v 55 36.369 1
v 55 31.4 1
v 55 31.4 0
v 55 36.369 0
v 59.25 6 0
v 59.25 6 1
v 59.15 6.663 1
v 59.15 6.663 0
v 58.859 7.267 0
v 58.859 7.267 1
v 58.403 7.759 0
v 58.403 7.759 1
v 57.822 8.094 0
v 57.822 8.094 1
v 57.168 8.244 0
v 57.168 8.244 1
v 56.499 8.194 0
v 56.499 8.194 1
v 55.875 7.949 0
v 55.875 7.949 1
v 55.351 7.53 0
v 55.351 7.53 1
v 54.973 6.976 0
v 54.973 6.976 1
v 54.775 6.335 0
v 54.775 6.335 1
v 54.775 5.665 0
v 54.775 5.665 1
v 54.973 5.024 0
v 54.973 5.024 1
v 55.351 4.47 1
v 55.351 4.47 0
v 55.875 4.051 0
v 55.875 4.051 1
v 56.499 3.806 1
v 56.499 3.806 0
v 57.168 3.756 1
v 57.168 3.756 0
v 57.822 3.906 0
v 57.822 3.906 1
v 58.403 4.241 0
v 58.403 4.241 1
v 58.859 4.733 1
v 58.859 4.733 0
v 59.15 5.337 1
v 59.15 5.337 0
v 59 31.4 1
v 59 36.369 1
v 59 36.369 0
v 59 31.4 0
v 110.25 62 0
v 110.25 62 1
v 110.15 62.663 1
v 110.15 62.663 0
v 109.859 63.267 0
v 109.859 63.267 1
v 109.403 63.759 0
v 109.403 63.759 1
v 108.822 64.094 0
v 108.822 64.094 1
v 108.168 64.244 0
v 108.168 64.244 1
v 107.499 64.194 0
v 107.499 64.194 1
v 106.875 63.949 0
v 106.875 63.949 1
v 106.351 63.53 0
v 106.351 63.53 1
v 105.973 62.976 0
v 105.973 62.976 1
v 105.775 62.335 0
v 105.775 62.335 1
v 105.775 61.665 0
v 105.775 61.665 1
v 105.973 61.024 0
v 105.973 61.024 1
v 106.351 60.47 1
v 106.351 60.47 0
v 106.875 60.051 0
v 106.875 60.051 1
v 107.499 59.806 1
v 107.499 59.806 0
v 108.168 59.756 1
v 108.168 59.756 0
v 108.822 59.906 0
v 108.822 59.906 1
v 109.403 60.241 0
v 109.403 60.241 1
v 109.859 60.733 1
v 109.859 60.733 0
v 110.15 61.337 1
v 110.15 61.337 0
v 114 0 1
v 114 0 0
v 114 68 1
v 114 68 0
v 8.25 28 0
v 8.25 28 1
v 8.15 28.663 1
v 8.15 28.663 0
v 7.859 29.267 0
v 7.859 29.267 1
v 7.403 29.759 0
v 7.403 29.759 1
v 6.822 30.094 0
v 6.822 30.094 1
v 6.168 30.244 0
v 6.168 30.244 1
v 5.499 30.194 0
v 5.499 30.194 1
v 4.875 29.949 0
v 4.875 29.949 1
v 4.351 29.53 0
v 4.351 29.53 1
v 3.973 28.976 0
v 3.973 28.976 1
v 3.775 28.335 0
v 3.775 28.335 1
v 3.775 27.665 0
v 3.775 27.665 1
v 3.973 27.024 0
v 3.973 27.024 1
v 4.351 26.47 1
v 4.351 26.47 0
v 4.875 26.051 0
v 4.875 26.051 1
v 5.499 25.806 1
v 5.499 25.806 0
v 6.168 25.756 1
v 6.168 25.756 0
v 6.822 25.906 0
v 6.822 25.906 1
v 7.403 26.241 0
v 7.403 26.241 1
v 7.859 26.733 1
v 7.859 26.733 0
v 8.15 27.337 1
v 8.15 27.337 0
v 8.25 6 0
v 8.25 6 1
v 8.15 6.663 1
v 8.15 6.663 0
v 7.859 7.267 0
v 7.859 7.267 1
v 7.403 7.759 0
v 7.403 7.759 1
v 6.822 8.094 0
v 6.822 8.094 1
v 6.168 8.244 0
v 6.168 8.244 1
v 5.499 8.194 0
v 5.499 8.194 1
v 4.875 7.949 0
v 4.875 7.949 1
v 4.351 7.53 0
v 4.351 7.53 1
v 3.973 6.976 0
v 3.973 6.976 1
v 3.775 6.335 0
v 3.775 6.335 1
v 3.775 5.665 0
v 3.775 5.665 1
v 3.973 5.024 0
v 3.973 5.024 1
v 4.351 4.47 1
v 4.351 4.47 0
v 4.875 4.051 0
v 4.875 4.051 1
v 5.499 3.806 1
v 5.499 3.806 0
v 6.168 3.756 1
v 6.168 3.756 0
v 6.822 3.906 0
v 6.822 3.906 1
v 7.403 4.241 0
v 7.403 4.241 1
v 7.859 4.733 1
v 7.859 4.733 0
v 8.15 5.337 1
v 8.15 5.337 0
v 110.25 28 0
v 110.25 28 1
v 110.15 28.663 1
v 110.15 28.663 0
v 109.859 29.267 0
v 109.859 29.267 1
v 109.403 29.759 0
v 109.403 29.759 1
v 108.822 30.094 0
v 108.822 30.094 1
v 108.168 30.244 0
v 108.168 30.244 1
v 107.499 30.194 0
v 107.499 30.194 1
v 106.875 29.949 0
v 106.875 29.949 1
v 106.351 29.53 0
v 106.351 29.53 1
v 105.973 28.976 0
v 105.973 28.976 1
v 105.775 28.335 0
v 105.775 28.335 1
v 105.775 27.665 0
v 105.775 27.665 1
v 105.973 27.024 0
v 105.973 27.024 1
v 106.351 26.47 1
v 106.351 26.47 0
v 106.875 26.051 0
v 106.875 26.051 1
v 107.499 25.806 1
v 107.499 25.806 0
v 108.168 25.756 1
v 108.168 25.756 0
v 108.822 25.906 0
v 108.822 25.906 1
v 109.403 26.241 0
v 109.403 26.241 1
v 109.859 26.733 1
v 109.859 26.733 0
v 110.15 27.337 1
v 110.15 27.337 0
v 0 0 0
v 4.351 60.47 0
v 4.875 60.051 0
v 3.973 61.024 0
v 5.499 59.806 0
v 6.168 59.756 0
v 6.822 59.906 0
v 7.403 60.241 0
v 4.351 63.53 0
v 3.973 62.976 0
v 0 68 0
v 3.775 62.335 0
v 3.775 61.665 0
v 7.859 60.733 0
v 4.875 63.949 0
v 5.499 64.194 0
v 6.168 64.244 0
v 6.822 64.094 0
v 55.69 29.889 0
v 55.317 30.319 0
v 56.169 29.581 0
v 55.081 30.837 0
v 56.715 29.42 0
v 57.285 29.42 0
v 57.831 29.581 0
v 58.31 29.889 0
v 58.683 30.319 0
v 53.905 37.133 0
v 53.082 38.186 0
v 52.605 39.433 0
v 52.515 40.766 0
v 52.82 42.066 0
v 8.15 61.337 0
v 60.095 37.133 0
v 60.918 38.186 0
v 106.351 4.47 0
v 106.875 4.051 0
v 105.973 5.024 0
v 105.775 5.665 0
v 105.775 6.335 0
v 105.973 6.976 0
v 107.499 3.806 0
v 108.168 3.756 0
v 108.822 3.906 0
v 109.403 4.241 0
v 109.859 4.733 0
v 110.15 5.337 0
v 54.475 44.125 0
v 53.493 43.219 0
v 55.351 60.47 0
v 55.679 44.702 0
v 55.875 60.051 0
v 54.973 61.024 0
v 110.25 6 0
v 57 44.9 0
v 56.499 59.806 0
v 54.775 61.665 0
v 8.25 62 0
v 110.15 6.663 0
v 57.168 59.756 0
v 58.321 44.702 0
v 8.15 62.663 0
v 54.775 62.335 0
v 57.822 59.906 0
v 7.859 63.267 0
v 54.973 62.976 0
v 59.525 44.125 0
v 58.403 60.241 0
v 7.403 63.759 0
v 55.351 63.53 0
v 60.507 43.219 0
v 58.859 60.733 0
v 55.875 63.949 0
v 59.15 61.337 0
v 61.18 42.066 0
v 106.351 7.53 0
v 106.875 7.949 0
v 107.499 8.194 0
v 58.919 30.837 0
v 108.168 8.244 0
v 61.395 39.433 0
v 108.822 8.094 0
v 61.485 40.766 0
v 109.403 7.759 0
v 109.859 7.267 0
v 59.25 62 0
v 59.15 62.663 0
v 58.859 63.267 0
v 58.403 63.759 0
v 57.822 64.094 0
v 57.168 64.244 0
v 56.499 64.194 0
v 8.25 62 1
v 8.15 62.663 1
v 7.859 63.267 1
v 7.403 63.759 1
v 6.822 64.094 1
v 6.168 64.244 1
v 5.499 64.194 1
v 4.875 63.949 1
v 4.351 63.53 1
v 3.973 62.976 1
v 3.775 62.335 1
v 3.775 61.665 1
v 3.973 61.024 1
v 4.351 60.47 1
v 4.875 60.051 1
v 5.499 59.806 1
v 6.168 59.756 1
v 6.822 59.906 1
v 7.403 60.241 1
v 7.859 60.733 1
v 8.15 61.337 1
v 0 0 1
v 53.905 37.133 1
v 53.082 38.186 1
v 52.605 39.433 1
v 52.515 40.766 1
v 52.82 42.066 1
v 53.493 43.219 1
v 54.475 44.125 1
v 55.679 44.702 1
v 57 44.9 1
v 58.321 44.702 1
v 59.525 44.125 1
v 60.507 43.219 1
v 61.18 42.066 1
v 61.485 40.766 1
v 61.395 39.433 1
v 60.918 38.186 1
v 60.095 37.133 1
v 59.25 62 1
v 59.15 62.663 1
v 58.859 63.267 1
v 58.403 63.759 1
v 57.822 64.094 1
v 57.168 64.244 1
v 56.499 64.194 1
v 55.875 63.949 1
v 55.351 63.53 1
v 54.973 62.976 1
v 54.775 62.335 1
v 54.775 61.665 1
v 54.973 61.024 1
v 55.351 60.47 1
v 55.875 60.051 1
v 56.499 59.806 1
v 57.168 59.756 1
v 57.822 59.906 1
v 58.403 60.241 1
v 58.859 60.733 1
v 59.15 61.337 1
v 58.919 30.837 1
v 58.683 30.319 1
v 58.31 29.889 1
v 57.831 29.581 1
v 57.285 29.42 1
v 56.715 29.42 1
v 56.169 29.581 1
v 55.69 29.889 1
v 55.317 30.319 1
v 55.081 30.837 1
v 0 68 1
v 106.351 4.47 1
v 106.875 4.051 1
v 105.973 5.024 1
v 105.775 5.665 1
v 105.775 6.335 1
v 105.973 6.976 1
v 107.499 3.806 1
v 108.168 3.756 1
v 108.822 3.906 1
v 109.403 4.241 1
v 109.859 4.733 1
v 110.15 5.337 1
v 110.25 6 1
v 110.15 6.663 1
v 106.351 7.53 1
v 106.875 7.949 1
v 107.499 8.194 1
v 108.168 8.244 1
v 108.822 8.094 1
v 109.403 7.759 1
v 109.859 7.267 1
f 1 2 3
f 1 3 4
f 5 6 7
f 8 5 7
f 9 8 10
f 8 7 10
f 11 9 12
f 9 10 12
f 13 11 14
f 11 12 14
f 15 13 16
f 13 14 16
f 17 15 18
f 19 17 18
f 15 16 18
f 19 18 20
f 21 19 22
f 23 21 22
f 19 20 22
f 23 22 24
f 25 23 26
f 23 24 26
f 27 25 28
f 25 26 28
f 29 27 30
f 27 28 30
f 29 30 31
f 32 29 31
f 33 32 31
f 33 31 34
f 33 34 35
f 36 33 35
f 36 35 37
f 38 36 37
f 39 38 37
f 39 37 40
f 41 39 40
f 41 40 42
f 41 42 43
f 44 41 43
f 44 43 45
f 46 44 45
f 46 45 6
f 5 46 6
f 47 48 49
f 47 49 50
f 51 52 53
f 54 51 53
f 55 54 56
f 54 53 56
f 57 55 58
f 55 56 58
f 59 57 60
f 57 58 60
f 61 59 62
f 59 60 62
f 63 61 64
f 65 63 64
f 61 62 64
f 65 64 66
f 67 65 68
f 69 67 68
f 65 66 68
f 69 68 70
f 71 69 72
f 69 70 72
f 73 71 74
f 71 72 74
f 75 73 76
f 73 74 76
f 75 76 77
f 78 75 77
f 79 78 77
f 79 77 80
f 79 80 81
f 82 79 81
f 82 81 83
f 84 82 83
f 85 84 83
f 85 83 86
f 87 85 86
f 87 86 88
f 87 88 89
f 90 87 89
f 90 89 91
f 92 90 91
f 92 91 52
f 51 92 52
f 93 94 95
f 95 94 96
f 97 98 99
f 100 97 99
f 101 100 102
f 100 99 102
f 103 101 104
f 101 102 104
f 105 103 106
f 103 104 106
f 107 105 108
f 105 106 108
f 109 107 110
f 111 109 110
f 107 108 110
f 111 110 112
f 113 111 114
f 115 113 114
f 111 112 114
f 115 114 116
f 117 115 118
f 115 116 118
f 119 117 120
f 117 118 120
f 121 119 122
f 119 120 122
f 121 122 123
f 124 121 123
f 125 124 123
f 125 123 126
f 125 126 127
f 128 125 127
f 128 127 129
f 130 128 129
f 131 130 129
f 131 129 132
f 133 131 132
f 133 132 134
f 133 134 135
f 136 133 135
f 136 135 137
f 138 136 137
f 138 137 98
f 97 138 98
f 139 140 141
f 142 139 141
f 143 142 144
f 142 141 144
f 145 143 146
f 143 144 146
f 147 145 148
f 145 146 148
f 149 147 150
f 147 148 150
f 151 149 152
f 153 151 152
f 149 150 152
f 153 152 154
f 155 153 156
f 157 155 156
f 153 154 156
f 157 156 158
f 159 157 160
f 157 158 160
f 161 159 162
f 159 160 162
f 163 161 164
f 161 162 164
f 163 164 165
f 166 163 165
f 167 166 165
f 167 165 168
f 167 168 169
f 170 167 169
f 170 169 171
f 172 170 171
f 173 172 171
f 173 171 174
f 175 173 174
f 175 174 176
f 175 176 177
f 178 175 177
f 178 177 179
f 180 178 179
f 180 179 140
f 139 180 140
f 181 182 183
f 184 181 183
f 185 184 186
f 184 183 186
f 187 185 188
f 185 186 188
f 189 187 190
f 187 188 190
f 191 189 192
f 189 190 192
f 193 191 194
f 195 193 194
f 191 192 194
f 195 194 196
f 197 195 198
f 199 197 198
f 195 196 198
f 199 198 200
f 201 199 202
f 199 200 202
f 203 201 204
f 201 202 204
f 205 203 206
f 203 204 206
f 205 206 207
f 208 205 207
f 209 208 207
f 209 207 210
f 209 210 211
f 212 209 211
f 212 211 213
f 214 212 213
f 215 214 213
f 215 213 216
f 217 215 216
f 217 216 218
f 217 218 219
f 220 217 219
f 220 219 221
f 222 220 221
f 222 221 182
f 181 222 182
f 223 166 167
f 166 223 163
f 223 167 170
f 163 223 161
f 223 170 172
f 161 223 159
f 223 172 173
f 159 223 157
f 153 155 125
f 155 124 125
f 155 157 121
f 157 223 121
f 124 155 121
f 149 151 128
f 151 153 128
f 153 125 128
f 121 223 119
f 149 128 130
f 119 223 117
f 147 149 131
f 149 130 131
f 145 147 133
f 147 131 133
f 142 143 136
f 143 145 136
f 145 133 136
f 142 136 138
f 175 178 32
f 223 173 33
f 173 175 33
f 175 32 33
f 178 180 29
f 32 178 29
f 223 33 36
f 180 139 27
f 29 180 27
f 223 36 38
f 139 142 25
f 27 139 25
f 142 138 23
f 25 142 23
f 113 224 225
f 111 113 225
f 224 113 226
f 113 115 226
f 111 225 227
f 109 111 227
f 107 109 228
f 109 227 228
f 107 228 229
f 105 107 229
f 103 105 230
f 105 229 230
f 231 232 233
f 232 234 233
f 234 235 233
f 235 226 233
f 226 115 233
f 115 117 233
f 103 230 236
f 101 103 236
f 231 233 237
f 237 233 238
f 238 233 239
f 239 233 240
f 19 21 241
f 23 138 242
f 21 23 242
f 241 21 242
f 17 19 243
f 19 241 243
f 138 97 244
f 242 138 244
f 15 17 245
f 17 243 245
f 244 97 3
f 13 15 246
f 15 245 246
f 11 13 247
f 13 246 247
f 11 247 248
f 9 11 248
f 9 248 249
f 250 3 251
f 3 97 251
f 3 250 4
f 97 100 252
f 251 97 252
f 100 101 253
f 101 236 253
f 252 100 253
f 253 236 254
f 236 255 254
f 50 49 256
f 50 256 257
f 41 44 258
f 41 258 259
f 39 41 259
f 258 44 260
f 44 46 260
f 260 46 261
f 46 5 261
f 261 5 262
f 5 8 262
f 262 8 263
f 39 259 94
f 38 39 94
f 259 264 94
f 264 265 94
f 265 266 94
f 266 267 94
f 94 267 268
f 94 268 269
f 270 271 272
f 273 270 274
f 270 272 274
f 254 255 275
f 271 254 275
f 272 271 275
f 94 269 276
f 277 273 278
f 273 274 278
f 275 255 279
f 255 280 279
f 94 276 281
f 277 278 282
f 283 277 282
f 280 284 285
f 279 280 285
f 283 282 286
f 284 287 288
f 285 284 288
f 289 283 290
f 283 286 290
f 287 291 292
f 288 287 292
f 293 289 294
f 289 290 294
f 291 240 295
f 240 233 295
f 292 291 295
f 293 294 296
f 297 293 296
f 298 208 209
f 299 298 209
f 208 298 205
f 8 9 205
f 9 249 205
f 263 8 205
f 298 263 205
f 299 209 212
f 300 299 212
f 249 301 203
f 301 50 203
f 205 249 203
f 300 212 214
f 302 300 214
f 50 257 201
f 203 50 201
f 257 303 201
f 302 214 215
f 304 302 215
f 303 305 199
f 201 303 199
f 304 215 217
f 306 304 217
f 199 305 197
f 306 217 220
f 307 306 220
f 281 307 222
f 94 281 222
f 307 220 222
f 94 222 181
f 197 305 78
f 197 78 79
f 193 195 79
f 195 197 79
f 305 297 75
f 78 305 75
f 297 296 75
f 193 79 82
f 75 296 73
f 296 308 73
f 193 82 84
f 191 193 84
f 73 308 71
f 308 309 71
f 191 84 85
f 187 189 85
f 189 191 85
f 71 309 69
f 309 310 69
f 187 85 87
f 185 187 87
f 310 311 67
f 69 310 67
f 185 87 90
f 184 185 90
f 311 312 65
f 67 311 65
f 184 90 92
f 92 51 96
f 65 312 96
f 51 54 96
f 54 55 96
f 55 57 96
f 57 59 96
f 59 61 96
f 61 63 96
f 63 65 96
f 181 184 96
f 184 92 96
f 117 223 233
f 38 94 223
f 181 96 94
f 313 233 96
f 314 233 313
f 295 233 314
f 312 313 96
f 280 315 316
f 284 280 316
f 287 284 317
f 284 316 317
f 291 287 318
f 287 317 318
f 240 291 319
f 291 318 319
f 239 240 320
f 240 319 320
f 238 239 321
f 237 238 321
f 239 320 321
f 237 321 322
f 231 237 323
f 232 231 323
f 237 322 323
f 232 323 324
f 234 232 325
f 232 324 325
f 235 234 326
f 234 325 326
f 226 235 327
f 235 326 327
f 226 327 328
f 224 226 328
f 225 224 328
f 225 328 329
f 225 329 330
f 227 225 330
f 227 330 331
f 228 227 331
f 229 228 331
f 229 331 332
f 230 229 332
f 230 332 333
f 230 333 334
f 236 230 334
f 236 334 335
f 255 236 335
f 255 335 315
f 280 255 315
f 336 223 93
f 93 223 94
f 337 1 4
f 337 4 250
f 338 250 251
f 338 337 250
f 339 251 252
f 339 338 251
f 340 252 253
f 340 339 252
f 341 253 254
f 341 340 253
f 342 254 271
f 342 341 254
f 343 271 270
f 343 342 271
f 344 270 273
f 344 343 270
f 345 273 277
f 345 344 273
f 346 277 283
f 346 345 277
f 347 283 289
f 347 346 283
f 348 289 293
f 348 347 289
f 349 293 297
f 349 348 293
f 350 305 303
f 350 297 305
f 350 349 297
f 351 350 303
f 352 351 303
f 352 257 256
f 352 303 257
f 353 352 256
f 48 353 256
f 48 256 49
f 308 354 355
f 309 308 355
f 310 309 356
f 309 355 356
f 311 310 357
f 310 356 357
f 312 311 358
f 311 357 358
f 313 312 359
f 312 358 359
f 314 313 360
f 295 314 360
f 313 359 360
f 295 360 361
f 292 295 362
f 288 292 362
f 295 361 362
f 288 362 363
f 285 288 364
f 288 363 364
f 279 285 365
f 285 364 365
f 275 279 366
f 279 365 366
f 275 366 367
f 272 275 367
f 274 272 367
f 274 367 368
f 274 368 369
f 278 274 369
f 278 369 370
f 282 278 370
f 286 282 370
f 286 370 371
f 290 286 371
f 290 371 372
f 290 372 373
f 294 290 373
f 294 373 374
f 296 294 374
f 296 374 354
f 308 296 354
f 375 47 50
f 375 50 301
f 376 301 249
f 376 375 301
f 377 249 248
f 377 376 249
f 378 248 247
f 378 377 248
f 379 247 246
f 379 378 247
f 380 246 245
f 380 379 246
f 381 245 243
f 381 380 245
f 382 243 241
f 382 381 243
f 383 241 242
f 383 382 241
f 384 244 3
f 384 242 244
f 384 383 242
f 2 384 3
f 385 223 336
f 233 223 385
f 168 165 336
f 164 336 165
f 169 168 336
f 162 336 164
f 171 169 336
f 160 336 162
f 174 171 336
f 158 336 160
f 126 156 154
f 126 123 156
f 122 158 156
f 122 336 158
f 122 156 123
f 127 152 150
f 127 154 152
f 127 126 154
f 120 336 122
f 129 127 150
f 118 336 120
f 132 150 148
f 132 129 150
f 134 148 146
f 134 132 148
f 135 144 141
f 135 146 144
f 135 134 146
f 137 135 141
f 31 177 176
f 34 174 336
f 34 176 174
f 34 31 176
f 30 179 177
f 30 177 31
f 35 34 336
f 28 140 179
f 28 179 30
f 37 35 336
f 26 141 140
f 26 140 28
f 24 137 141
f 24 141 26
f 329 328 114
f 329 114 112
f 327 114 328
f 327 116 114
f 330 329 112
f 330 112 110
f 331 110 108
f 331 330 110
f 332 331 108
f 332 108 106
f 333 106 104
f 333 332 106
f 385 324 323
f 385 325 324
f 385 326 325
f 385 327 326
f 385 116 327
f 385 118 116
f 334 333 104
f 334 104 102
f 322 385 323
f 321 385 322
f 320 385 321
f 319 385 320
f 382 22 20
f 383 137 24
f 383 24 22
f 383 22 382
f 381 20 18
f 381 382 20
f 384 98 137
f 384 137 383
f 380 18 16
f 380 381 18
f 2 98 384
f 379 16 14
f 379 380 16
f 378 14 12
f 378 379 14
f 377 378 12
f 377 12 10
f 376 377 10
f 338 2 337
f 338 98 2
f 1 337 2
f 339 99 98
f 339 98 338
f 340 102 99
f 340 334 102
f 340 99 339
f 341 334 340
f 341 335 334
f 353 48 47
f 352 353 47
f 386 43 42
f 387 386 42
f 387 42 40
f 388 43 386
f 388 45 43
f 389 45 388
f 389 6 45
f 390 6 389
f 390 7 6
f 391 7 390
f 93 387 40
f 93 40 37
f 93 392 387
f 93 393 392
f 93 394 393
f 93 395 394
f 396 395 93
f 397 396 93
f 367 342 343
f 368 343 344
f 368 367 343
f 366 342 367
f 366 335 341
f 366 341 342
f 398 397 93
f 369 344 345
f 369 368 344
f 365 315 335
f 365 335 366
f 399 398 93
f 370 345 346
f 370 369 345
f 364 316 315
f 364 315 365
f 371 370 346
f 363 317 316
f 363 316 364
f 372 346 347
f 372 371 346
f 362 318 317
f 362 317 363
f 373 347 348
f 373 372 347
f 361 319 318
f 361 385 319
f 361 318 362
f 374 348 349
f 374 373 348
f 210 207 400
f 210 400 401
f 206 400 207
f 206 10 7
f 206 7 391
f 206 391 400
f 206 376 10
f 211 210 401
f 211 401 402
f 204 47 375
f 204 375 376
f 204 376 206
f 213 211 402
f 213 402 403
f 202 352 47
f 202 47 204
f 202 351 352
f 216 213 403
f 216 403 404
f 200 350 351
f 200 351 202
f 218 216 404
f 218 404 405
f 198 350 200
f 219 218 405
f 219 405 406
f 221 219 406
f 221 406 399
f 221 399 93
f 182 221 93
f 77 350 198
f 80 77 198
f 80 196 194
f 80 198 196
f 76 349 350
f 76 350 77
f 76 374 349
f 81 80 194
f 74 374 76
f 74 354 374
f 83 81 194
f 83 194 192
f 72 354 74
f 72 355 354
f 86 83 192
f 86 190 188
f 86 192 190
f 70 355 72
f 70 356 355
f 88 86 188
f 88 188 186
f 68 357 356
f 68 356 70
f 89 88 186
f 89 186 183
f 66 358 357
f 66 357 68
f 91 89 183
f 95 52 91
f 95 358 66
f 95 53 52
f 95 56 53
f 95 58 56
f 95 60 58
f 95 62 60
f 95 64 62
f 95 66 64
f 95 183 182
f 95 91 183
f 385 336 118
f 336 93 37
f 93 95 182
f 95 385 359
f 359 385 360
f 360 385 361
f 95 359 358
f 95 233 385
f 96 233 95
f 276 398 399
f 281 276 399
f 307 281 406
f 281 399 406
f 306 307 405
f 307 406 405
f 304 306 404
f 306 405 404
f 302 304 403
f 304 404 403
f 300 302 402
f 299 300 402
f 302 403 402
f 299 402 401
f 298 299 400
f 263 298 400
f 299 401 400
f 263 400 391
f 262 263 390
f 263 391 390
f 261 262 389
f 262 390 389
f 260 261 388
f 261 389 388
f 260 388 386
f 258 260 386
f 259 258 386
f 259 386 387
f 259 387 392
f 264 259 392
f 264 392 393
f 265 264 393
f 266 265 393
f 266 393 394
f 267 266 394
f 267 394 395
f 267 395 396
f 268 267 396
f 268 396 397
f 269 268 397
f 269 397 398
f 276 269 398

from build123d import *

# Parameters (mm, degrees)
SKETCH_1_W          = 114
SKETCH_1_H          = 68
EXTRUDE_1_DEPTH     = 1
CUT_EXTRUDE_1_REACH = 3
SKETCH_2_R          = 2.25


with BuildPart() as part:
    # Эскиз1 → Бобышка-Вытянуть1 (new body)
    with BuildSketch(Plane.XY):
        with Locations((57, 34)):
            Rectangle(SKETCH_1_W, SKETCH_1_H)
    extrude(amount=EXTRUDE_1_DEPTH)

    # Эскиз2 → Вырез-Вытянуть1 (cut, up to next)
    with BuildSketch(Plane.XY.offset(1), mode=Mode.PRIVATE) as cut_extrude_1_sk1:
        with Locations((6, 62)):
            Circle(SKETCH_2_R)
    cut_extrude_1_tool1 = extrude(cut_extrude_1_sk1.sketch, amount=-CUT_EXTRUDE_1_REACH, mode=Mode.PRIVATE) & part.part
    add(cut_extrude_1_tool1.solids().sort_by_distance((6, 62, 1))[0], mode=Mode.SUBTRACT)
    # Эскиз2 → Вырез-Вытянуть1 (cut, up to next)
    with BuildSketch(Plane.XY.offset(1), mode=Mode.PRIVATE) as cut_extrude_1_sk2:
        with Locations((6, 28)):
            Circle(SKETCH_2_R)
    cut_extrude_1_tool2 = extrude(cut_extrude_1_sk2.sketch, amount=-CUT_EXTRUDE_1_REACH, mode=Mode.PRIVATE) & part.part
    add(cut_extrude_1_tool2.solids().sort_by_distance((6, 28, 1))[0], mode=Mode.SUBTRACT)
    # Эскиз2 → Вырез-Вытянуть1 (cut, up to next)
    with BuildSketch(Plane.XY.offset(1), mode=Mode.PRIVATE) as cut_extrude_1_sk3:
        with Locations((6, 6)):
            Circle(SKETCH_2_R)
    cut_extrude_1_tool3 = extrude(cut_extrude_1_sk3.sketch, amount=-CUT_EXTRUDE_1_REACH, mode=Mode.PRIVATE) & part.part
    add(cut_extrude_1_tool3.solids().sort_by_distance((6, 6, 1))[0], mode=Mode.SUBTRACT)
    # Эскиз2 → Вырез-Вытянуть1 (cut, up to next)
    with BuildSketch(Plane.XY.offset(1), mode=Mode.PRIVATE) as cut_extrude_1_sk4:
        with Locations((57, 6)):
            Circle(SKETCH_2_R)
    cut_extrude_1_tool4 = extrude(cut_extrude_1_sk4.sketch, amount=-CUT_EXTRUDE_1_REACH, mode=Mode.PRIVATE) & part.part
    add(cut_extrude_1_tool4.solids().sort_by_distance((57, 6, 1))[0], mode=Mode.SUBTRACT)
    # Эскиз2 → Вырез-Вытянуть1 (cut, up to next)
    with BuildSketch(Plane.XY.offset(1), mode=Mode.PRIVATE) as cut_extrude_1_sk5:
        with Locations((57, 62)):
            Circle(SKETCH_2_R)
    cut_extrude_1_tool5 = extrude(cut_extrude_1_sk5.sketch, amount=-CUT_EXTRUDE_1_REACH, mode=Mode.PRIVATE) & part.part
    add(cut_extrude_1_tool5.solids().sort_by_distance((57, 62, 1))[0], mode=Mode.SUBTRACT)
    # Эскиз2 → Вырез-Вытянуть1 (cut, up to next)
    with BuildSketch(Plane.XY.offset(1), mode=Mode.PRIVATE) as cut_extrude_1_sk6:
        with Locations((108, 62)):
            Circle(SKETCH_2_R)
    cut_extrude_1_tool6 = extrude(cut_extrude_1_sk6.sketch, amount=-CUT_EXTRUDE_1_REACH, mode=Mode.PRIVATE) & part.part
    add(cut_extrude_1_tool6.solids().sort_by_distance((108, 62, 1))[0], mode=Mode.SUBTRACT)
    # Эскиз2 → Вырез-Вытянуть1 (cut, up to next)
    with BuildSketch(Plane.XY.offset(1), mode=Mode.PRIVATE) as cut_extrude_1_sk7:
        with Locations((108, 28)):
            Circle(SKETCH_2_R)
    cut_extrude_1_tool7 = extrude(cut_extrude_1_sk7.sketch, amount=-CUT_EXTRUDE_1_REACH, mode=Mode.PRIVATE) & part.part
    add(cut_extrude_1_tool7.solids().sort_by_distance((108, 28, 1))[0], mode=Mode.SUBTRACT)
    # Эскиз2 → Вырез-Вытянуть1 (cut, up to next)
    with BuildSketch(Plane.XY.offset(1), mode=Mode.PRIVATE) as cut_extrude_1_sk8:
        with Locations((108, 6)):
            Circle(SKETCH_2_R)
    cut_extrude_1_tool8 = extrude(cut_extrude_1_sk8.sketch, amount=-CUT_EXTRUDE_1_REACH, mode=Mode.PRIVATE) & part.part
    add(cut_extrude_1_tool8.solids().sort_by_distance((108, 6, 1))[0], mode=Mode.SUBTRACT)
    # Эскиз2 → Вырез-Вытянуть1 (cut, up to next)
    with BuildSketch(Plane.XY.offset(1), mode=Mode.PRIVATE) as cut_extrude_1_sk9:
        with BuildLine():
            Line((59, 36.368871126), (59, 31.4))
            ThreePointArc((59, 31.4), (57, 29.4), (55, 31.4))
            Line((55, 31.4), (55, 36.368871126))
            ThreePointArc((55, 36.368871126), (57, 44.9), (59, 36.368871126))
        make_face()
    cut_extrude_1_tool9 = extrude(cut_extrude_1_sk9.sketch, amount=-CUT_EXTRUDE_1_REACH, mode=Mode.PRIVATE) & part.part
    add(cut_extrude_1_tool9.solids().sort_by_distance((57, 38.298039, 1))[0], mode=Mode.SUBTRACT)


solid = part.part
